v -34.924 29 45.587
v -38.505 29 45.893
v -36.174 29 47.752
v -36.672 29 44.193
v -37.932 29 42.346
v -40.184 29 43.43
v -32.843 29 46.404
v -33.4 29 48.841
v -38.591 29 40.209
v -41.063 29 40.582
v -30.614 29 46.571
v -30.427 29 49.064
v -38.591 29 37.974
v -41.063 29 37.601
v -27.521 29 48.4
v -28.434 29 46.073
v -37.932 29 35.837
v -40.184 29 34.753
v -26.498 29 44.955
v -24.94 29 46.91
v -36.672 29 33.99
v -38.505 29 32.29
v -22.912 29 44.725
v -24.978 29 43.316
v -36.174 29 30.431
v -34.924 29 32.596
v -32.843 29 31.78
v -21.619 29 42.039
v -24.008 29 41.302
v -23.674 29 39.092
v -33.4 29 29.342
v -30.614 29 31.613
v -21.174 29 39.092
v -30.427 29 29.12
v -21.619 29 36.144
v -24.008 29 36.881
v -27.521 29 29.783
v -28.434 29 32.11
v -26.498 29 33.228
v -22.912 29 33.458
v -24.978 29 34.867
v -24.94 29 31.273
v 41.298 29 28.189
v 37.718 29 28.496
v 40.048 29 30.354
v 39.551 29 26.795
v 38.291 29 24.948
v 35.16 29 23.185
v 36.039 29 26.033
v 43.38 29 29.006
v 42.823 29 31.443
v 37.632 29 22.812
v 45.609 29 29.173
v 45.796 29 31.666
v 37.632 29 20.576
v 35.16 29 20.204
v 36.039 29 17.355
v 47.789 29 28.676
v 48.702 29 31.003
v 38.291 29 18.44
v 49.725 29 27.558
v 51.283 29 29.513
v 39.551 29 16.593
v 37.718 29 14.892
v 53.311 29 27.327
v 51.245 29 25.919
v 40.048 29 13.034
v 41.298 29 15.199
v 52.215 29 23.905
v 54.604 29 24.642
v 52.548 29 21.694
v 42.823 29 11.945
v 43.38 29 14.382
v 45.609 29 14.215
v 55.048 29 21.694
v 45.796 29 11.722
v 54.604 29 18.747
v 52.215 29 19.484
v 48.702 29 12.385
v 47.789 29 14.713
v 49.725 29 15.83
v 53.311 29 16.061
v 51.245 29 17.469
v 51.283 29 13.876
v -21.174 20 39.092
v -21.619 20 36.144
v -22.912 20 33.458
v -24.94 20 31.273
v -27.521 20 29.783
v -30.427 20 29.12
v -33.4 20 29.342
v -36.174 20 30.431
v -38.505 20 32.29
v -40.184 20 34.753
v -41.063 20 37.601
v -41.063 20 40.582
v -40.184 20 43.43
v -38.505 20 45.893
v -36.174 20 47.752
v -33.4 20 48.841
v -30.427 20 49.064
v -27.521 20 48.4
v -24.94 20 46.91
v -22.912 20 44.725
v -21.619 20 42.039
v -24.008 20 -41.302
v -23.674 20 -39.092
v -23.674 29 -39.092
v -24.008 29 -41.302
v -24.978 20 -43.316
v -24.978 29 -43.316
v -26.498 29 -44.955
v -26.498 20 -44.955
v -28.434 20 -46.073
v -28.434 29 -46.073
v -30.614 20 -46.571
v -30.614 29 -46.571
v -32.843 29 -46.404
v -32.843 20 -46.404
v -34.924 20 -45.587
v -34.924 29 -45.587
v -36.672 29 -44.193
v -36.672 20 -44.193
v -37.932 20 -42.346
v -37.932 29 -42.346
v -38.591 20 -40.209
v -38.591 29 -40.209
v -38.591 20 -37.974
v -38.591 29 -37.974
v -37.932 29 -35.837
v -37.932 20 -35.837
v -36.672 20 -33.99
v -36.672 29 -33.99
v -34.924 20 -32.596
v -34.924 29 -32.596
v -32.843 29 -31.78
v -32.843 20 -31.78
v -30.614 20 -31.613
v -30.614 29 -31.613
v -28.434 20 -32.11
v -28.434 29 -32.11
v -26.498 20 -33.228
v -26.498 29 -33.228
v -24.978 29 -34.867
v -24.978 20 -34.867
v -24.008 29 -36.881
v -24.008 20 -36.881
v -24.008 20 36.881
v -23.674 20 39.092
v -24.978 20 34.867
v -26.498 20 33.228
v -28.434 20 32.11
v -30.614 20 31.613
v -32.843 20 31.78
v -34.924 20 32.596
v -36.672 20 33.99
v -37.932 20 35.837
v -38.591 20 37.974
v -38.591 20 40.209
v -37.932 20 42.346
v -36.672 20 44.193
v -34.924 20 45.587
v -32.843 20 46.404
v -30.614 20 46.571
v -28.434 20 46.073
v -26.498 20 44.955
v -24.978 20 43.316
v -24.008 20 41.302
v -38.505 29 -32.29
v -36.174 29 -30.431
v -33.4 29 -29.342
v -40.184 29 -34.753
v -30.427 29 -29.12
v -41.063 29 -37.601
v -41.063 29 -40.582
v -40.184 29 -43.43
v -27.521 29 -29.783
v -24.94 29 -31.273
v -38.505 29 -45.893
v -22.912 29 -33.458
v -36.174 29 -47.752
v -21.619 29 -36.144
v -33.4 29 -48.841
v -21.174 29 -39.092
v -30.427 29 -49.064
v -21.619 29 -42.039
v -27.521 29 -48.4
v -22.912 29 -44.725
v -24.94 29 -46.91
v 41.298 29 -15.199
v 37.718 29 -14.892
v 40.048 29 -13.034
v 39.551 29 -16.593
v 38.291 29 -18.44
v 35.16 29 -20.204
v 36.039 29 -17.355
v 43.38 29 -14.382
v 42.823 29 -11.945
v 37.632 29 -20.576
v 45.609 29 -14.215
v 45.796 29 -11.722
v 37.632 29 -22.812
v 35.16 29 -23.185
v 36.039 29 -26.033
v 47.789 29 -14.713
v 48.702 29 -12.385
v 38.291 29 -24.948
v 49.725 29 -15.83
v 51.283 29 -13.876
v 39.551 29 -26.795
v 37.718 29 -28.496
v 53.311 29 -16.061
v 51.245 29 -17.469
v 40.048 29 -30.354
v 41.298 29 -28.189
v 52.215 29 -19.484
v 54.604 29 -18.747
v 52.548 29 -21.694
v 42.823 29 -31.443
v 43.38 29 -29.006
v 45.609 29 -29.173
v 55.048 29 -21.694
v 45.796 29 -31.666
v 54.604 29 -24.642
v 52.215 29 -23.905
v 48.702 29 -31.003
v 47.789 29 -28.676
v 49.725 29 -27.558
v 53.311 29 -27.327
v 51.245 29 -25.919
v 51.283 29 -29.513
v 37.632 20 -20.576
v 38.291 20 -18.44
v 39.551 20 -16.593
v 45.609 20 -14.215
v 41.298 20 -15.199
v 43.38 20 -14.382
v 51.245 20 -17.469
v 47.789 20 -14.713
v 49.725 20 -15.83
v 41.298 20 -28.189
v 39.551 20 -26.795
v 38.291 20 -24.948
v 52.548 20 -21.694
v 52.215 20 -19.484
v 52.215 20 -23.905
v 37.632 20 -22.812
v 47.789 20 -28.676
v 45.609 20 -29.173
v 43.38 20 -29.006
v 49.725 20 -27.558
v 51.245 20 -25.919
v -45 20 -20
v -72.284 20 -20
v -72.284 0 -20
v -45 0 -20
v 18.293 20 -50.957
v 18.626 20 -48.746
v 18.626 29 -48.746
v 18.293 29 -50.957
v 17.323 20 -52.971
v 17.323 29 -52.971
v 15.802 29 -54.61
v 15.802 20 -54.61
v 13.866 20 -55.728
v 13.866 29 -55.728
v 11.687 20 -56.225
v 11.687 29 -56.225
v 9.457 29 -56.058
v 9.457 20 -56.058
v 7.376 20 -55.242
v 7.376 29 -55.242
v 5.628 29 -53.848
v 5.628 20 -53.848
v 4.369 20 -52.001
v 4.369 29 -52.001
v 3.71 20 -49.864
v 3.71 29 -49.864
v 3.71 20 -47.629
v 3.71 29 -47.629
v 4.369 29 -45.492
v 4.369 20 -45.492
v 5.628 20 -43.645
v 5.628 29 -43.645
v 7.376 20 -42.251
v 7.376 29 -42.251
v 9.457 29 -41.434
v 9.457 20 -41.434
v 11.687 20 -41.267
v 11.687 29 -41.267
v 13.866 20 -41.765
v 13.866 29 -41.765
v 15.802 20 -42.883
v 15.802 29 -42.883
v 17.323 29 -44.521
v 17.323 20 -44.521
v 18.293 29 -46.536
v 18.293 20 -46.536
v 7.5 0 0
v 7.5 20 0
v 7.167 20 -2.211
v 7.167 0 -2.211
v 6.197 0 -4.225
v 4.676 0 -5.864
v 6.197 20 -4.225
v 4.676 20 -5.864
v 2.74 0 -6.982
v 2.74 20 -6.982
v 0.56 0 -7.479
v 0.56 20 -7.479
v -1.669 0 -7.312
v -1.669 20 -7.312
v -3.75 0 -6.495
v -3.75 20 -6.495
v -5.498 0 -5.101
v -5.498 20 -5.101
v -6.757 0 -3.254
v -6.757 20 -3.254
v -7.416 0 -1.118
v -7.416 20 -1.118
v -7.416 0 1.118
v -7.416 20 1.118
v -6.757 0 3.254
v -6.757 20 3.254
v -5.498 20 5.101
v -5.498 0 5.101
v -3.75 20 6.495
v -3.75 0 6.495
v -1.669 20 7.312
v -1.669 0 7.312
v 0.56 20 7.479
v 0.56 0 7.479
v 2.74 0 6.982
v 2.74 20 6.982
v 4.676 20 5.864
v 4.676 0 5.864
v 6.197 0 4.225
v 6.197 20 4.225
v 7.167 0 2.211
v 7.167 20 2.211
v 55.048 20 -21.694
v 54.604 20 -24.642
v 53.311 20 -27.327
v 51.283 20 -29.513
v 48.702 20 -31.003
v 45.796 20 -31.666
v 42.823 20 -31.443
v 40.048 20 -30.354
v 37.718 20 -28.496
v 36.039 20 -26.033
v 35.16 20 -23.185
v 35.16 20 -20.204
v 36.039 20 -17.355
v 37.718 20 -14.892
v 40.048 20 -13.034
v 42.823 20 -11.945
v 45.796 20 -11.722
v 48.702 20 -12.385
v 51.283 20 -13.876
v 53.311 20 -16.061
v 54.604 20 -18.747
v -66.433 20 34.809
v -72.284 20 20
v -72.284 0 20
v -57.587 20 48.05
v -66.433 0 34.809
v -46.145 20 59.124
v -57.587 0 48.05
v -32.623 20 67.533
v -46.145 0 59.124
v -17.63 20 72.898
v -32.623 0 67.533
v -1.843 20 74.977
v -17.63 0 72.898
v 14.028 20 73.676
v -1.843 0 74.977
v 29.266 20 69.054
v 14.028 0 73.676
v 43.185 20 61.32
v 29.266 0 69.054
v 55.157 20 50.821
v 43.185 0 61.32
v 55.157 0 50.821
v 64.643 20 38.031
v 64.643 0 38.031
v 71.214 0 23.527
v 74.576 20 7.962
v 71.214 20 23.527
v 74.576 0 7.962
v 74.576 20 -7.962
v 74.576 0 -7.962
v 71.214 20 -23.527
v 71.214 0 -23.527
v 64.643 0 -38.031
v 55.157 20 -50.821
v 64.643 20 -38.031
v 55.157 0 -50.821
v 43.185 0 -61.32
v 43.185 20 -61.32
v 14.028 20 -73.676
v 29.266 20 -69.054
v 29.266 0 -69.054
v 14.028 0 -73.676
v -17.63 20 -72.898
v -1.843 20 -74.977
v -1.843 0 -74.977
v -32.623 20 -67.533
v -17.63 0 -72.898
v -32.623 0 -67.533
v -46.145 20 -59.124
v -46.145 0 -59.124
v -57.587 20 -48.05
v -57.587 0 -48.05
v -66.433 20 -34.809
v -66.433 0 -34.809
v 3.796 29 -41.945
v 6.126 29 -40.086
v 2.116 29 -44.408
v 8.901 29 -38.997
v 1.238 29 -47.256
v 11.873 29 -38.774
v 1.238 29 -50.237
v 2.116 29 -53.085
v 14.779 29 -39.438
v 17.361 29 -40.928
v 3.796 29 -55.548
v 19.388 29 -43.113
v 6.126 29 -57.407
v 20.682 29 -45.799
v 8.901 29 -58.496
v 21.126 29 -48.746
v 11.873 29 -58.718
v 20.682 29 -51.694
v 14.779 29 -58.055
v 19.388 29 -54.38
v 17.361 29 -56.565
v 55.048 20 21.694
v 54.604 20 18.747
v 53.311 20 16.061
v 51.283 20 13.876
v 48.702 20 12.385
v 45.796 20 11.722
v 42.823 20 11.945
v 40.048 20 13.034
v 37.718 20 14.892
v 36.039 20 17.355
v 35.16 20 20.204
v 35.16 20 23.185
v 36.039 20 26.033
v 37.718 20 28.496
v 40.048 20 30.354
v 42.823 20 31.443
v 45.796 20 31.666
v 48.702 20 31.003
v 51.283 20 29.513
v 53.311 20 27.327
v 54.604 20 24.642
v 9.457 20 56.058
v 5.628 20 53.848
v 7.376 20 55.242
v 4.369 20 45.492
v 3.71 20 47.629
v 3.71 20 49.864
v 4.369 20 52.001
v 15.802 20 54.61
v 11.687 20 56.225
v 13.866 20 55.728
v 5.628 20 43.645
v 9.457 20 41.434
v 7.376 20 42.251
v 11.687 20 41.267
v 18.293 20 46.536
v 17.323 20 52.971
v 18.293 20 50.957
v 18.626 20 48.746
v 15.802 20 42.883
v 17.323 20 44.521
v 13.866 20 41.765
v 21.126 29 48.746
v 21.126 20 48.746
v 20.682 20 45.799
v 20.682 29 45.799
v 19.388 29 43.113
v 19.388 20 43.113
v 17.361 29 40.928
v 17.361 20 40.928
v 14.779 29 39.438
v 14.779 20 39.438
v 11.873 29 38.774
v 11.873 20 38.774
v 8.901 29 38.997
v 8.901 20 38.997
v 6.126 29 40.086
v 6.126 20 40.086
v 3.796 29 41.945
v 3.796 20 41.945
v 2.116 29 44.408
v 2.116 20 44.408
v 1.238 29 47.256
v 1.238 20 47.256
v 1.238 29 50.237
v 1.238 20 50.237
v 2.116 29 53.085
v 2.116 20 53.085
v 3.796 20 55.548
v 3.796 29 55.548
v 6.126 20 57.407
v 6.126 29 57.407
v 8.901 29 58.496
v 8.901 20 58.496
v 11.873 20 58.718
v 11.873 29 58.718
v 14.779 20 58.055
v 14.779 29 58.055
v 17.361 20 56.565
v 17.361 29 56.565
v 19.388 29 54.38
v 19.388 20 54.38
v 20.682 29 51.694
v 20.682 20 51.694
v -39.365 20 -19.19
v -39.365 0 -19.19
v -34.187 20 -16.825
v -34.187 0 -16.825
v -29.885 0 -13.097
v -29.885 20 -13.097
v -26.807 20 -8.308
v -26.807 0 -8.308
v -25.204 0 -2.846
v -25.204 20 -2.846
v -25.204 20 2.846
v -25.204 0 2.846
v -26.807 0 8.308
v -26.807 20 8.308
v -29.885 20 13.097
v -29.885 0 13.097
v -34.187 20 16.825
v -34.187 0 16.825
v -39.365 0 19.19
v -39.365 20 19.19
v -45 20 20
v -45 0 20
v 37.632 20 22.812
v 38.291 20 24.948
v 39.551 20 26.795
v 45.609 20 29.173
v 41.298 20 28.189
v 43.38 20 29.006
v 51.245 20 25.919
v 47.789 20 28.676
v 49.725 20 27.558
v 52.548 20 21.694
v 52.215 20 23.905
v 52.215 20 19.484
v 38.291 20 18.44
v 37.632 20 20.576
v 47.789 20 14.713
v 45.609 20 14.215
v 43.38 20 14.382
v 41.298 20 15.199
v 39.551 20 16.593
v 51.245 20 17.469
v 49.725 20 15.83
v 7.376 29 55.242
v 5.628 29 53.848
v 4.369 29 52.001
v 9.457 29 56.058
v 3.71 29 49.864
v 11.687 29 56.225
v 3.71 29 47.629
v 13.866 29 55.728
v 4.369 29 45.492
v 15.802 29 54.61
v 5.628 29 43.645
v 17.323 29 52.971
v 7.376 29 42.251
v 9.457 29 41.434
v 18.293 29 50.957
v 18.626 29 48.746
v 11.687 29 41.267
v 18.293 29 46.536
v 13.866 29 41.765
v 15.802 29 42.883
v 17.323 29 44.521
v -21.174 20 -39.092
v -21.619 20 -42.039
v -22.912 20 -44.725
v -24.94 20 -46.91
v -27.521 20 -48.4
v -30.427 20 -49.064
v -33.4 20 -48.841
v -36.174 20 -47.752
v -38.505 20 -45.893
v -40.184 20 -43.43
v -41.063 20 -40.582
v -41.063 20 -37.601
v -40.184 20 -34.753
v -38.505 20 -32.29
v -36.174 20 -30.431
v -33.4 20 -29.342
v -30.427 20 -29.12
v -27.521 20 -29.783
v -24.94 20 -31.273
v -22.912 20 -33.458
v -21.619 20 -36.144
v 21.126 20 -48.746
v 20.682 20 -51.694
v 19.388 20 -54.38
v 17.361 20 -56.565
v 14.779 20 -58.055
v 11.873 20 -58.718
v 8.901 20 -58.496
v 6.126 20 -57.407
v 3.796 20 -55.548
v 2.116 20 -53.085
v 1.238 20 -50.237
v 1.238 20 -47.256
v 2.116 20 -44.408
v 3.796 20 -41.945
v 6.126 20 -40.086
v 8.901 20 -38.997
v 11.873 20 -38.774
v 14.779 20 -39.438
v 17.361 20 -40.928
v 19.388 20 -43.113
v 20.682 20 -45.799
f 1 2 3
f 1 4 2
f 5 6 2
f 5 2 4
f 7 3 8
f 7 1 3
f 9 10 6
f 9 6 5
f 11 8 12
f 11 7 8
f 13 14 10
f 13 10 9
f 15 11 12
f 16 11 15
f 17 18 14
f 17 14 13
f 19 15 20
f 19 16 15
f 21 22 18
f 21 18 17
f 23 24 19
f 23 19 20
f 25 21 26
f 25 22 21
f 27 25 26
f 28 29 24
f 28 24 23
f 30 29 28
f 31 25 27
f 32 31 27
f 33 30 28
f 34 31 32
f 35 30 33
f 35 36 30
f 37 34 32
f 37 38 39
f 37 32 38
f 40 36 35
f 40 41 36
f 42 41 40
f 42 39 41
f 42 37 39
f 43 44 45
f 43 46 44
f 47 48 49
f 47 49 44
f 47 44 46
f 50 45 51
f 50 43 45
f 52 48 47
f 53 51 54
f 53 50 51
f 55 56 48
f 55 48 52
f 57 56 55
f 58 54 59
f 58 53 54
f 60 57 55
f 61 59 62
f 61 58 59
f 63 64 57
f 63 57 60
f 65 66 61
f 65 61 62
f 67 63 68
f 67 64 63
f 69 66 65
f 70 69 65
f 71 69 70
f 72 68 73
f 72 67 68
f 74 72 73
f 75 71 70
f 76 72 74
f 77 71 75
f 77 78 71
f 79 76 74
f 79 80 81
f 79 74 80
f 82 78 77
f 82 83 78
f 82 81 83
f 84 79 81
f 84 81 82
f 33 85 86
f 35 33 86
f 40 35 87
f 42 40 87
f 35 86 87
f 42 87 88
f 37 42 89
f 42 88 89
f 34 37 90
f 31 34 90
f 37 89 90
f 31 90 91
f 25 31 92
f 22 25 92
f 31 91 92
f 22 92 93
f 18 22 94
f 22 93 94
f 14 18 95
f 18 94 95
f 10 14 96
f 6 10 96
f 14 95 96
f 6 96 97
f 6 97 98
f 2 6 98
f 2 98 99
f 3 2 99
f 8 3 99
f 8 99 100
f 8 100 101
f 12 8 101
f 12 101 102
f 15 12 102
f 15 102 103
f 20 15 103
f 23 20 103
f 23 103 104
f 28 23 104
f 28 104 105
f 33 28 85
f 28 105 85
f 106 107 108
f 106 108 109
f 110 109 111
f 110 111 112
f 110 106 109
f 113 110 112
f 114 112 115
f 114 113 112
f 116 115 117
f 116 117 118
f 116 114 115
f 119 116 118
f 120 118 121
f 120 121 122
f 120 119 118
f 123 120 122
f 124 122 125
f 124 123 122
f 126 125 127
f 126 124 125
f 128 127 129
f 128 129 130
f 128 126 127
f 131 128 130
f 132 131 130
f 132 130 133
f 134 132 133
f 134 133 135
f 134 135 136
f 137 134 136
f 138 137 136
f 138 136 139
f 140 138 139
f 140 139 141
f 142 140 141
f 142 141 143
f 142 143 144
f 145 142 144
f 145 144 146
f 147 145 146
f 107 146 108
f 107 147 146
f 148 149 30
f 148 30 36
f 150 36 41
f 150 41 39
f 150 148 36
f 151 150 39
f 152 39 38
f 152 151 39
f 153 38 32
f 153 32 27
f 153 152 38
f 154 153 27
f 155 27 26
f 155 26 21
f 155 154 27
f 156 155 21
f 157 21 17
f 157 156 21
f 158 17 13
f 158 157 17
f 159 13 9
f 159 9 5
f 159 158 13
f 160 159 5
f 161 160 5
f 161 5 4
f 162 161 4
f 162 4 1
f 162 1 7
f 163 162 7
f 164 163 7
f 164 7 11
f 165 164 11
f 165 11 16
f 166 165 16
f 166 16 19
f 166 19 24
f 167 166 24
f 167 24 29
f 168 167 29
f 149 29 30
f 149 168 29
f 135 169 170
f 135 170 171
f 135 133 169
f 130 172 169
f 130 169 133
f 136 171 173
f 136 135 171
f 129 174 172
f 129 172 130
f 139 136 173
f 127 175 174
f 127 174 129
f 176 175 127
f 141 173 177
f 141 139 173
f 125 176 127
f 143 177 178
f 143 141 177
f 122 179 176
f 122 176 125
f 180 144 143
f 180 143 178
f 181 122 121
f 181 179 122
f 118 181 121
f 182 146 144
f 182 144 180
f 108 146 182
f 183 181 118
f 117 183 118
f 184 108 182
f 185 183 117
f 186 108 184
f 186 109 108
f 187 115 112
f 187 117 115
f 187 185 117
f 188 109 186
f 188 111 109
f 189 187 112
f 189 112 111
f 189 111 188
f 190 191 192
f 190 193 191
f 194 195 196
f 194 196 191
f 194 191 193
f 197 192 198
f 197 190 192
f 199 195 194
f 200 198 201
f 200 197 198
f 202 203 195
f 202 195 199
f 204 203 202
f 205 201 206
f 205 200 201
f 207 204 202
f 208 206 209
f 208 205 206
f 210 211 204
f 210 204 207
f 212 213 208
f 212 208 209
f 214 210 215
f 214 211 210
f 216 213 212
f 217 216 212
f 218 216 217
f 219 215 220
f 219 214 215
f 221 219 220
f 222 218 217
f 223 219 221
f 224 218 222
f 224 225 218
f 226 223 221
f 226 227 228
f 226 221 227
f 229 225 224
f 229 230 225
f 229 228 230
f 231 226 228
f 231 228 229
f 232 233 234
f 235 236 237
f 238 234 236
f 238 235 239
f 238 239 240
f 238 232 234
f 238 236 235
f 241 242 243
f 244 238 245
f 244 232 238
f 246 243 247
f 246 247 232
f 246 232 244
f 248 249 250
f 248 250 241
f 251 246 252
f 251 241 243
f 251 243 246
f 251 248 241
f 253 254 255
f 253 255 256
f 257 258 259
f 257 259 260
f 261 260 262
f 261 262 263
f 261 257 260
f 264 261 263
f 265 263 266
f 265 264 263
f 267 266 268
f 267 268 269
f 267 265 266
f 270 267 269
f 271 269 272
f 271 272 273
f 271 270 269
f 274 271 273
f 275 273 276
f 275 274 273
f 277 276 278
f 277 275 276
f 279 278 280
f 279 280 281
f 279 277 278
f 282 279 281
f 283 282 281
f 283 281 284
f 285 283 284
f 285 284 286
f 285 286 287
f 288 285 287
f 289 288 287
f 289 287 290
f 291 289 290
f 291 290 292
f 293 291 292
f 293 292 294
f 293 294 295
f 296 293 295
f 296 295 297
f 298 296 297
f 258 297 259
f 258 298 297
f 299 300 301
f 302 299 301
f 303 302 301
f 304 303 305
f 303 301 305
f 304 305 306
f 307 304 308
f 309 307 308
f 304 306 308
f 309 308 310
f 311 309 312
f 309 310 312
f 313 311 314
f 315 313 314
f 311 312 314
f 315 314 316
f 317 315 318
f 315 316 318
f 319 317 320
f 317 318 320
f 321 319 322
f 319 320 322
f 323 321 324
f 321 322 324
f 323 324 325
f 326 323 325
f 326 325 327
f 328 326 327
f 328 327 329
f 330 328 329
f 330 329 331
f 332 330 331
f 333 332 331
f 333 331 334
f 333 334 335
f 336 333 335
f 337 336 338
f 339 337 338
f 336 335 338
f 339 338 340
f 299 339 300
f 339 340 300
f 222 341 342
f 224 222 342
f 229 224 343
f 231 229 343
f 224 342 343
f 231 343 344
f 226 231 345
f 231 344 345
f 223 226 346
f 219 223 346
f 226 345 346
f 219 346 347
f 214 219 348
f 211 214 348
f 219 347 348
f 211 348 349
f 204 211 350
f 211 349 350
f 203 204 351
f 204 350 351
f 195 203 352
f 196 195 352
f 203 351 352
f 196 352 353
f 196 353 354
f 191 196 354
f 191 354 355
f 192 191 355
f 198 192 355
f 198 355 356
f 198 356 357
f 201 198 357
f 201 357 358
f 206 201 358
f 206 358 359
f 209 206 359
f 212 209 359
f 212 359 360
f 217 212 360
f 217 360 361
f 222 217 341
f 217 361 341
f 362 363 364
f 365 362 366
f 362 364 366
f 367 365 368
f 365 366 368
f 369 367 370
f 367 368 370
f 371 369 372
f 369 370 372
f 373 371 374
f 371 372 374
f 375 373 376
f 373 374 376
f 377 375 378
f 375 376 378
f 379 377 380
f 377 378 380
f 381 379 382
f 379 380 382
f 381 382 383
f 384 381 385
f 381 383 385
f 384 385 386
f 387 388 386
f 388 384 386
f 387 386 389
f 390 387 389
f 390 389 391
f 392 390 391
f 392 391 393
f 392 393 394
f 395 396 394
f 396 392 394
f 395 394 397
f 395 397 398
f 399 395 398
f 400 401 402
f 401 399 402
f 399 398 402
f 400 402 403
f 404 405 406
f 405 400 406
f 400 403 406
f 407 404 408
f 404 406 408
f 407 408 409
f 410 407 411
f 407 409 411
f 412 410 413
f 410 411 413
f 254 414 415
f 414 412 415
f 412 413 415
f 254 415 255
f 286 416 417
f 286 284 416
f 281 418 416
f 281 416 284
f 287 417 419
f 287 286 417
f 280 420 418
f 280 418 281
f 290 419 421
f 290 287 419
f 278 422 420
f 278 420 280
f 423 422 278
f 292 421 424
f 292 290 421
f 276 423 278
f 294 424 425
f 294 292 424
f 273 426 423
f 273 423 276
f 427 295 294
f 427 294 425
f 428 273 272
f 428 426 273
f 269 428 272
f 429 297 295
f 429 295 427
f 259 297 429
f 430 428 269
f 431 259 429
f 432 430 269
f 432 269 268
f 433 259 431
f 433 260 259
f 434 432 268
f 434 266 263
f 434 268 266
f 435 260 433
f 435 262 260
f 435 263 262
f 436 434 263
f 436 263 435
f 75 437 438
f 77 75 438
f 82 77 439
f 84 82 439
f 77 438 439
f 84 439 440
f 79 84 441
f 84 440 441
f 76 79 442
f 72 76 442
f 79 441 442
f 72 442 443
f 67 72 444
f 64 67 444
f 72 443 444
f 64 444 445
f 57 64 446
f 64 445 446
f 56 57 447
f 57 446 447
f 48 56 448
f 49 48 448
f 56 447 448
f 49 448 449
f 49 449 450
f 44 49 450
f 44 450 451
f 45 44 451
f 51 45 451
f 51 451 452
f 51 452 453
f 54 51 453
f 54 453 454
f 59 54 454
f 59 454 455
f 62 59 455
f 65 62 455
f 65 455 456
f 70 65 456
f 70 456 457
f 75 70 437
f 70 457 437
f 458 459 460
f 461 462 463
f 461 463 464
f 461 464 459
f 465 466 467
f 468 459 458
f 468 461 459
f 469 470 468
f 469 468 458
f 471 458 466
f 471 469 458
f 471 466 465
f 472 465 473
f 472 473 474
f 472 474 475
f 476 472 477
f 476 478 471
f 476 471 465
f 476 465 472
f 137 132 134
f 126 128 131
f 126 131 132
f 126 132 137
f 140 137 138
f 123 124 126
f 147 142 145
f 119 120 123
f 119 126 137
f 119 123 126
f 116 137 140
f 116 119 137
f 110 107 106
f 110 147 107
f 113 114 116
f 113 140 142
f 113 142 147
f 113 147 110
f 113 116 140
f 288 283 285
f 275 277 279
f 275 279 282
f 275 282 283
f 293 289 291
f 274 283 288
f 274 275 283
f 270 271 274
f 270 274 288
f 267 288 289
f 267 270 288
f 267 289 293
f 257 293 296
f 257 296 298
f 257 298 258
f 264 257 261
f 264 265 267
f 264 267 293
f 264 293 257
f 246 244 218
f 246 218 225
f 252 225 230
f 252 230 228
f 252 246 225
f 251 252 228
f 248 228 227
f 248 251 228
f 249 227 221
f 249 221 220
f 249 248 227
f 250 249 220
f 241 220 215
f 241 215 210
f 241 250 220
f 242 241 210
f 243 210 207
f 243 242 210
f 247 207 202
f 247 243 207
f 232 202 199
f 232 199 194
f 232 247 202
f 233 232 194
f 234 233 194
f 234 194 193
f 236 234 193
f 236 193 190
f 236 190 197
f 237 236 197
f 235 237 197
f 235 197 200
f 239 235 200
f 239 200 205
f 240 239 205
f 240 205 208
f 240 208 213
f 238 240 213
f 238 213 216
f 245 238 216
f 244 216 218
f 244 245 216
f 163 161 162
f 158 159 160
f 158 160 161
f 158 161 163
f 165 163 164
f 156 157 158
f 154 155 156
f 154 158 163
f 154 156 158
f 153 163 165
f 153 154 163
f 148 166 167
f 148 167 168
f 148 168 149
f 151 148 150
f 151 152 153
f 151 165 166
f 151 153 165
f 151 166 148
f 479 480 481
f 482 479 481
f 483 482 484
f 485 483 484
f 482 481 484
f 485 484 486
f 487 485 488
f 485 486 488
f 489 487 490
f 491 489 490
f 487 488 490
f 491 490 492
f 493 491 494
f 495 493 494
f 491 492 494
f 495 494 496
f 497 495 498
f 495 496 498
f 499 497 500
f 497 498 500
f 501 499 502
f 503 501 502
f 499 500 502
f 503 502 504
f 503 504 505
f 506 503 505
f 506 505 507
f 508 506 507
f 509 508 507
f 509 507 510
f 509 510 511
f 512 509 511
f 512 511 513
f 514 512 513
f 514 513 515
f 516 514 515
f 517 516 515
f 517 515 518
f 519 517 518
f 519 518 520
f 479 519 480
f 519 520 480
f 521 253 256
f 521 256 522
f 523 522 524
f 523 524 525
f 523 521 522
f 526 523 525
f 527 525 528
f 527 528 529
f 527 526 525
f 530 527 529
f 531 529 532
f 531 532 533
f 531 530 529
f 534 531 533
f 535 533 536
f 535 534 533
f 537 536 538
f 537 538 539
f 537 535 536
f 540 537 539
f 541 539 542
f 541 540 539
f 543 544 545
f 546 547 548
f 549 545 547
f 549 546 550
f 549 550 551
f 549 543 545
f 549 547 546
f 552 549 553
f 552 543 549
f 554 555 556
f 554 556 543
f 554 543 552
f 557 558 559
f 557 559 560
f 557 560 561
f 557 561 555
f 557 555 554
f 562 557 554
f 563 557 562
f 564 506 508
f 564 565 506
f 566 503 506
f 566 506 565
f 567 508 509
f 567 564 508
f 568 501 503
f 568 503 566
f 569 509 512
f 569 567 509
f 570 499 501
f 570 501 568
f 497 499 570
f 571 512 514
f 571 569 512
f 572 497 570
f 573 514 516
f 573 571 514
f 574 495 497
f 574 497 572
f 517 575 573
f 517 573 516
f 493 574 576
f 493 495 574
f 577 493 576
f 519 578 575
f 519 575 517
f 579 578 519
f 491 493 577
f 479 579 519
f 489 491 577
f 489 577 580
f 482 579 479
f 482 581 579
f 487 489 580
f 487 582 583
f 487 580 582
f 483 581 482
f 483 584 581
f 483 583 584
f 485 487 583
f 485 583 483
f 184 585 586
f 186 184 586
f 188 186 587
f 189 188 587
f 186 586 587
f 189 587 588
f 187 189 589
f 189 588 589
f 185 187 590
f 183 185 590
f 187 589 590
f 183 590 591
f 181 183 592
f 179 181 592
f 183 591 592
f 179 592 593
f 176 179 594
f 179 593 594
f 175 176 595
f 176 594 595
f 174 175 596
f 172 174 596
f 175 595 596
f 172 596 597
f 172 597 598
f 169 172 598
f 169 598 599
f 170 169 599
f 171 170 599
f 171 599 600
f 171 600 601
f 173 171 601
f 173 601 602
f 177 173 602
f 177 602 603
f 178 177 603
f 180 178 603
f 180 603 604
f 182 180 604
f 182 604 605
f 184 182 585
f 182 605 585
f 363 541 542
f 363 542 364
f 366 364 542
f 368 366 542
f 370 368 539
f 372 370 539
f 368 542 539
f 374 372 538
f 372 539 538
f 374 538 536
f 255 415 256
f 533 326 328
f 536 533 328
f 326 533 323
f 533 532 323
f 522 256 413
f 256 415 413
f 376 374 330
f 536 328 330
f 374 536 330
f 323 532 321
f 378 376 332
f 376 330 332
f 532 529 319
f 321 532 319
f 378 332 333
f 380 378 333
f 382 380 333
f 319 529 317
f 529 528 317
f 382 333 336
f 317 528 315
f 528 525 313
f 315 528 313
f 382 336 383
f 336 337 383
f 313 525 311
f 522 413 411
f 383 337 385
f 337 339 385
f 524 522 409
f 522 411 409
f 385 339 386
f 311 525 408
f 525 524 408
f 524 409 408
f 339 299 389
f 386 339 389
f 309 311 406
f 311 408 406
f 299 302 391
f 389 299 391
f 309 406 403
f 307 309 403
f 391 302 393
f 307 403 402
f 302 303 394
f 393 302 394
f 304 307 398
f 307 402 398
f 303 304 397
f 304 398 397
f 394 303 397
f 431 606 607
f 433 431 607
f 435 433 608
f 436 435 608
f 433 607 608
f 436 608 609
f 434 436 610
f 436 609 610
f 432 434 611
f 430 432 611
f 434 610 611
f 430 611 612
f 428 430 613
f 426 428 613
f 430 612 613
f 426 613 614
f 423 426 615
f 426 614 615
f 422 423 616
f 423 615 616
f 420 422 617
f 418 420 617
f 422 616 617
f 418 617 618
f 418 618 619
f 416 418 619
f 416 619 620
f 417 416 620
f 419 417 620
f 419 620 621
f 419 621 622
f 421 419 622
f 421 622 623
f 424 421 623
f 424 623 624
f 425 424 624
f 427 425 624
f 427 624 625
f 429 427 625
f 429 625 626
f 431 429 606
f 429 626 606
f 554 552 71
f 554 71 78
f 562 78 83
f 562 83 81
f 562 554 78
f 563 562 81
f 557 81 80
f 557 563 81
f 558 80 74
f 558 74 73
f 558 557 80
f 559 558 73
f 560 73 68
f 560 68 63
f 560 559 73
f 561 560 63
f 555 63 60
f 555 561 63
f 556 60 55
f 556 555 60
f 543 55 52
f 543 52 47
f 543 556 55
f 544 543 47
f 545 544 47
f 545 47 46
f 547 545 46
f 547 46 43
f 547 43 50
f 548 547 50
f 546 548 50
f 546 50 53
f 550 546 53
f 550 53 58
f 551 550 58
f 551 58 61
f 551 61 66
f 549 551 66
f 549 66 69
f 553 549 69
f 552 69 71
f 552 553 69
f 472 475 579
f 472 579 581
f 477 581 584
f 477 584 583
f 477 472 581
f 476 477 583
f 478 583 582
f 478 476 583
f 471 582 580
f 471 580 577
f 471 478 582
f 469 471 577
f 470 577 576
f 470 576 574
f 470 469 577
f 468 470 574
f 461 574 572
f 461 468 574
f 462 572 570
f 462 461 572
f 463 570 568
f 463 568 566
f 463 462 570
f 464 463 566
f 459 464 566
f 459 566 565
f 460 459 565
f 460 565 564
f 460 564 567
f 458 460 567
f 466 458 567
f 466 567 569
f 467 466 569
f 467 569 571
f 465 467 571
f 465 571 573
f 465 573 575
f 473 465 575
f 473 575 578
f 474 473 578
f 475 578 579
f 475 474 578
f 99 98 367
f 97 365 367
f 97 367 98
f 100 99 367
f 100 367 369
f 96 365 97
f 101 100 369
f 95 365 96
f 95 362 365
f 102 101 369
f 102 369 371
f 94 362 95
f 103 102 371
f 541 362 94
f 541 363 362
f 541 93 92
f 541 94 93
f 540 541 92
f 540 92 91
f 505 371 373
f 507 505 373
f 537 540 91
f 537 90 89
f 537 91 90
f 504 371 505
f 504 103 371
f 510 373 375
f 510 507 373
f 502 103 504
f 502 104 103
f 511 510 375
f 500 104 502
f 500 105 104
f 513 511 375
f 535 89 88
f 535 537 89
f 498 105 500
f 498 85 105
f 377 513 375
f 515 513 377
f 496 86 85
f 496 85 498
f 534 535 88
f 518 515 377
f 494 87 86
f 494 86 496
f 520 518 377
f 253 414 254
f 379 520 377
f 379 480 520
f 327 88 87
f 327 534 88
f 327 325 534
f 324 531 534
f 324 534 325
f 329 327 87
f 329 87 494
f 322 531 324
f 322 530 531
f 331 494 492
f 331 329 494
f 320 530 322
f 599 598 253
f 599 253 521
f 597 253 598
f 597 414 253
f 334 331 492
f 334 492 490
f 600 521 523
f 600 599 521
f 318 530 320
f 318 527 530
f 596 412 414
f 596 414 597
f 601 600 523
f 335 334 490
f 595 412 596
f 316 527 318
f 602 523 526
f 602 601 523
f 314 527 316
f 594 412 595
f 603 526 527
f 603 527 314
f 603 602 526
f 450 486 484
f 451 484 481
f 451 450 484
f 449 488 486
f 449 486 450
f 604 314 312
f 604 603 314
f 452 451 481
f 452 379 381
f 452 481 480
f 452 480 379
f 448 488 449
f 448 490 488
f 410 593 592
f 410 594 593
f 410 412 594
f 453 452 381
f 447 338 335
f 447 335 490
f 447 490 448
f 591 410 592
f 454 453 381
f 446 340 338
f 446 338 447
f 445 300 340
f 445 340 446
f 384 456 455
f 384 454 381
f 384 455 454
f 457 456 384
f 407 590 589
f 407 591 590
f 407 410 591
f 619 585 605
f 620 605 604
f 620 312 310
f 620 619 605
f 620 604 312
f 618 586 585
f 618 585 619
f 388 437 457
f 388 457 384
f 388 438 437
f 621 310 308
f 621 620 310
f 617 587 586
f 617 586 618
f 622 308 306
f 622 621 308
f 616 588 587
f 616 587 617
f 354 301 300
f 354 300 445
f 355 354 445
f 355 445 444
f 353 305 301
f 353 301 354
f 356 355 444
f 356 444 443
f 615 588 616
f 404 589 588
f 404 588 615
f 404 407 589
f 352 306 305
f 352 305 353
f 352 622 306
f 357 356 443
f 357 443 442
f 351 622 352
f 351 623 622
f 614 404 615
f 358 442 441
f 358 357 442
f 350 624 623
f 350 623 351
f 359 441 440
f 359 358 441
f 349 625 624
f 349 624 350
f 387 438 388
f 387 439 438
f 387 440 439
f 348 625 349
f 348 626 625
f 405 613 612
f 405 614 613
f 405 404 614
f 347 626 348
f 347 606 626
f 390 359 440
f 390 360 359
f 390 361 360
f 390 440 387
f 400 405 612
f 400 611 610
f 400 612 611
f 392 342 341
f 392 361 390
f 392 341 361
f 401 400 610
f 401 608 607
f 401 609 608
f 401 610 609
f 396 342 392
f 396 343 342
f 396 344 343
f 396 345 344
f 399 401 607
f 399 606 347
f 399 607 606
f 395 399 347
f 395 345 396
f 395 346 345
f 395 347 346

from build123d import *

# Parameters (mm, degrees)
SKETCH1_R           = 75
BOSS_EXTRUDE1_DEPTH = 20
SKETCH2_R           = 10
SKETCH2_R_2         = 7.5
BOSS_EXTRUDE2_DEPTH = 9
SKETCH3_R           = 7.5
CUT_EXTRUDE1_DEPTH  = 20
SKETCH4_R           = 15.621868033
CUT_EXTRUDE2_DEPTH  = 60


with BuildPart() as part:
    # Sketch1 → Boss-Extrude1 (new body)
    with BuildSketch(Plane(origin=(0, 0, 0), x_dir=(1, 0, 0), z_dir=(0, 1, 0))):
        Circle(SKETCH1_R)
    extrude(amount=BOSS_EXTRUDE1_DEPTH)

    # Sketch2 → Boss-Extrude2 (add)
    with BuildSketch(Plane(origin=(0, 20, 0), x_dir=(1, 0, 0), z_dir=(0, 1, 0))):
        with Locations((-50, 0)):
            Circle(SKETCH2_R)
        with Locations((-50, 0)):
            Circle(SKETCH2_R_2, mode=Mode.SUBTRACT)
        with Locations((-31.174490093, 39.091574123)):
            Circle(SKETCH2_R)
        with Locations((-31.174490093, 39.091574123)):
            Circle(SKETCH2_R_2, mode=Mode.SUBTRACT)
        with Locations((11.126046698, 48.746395609)):
            Circle(SKETCH2_R)
        with Locations((11.126046698, 48.746395609)):
            Circle(SKETCH2_R_2, mode=Mode.SUBTRACT)
        with Locations((45.048443395, 21.694186956)):
            Circle(SKETCH2_R)
        with Locations((45.048443395, 21.694186956)):
            Circle(SKETCH2_R_2, mode=Mode.SUBTRACT)
        with Locations((45.048443395, -21.694186956)):
            Circle(SKETCH2_R)
        with Locations((45.048443395, -21.694186956)):
            Circle(SKETCH2_R_2, mode=Mode.SUBTRACT)
        with Locations((11.126046698, -48.746395609)):
            Circle(SKETCH2_R)
        with Locations((11.126046698, -48.746395609)):
            Circle(SKETCH2_R_2, mode=Mode.SUBTRACT)
        with Locations((-31.174490093, -39.091574123)):
            Circle(SKETCH2_R)
        with Locations((-31.174490093, -39.091574123)):
            Circle(SKETCH2_R_2, mode=Mode.SUBTRACT)
    extrude(amount=BOSS_EXTRUDE2_DEPTH)

    # Sketch3 → Cut-Extrude1 (cut)
    with BuildSketch(Plane(origin=(0, 20, 0), x_dir=(1, 0, 0), z_dir=(0, 1, 0))):
        Circle(SKETCH3_R)
        with BuildLine():
            Line((-96.640436965, 20), (-45, 20))
            ThreePointArc((-45, 20), (-25, 0), (-45, -20))
            Line((-45, -20), (-96.640436965, -20))
            Line((-96.640436965, -20), (-96.640436965, 20))
        make_face()
    extrude(amount=-CUT_EXTRUDE1_DEPTH, mode=Mode.SUBTRACT)

    # Sketch4 → Cut-Extrude2 (cut)
    with BuildSketch(Plane(origin=(0, 0, 0), x_dir=(1, 0, 0), z_dir=(0, 1, 0))):
        with Locations((-50, 0)):
            Circle(SKETCH4_R)
    extrude(amount=CUT_EXTRUDE2_DEPTH, mode=Mode.SUBTRACT)


solid = part.part
